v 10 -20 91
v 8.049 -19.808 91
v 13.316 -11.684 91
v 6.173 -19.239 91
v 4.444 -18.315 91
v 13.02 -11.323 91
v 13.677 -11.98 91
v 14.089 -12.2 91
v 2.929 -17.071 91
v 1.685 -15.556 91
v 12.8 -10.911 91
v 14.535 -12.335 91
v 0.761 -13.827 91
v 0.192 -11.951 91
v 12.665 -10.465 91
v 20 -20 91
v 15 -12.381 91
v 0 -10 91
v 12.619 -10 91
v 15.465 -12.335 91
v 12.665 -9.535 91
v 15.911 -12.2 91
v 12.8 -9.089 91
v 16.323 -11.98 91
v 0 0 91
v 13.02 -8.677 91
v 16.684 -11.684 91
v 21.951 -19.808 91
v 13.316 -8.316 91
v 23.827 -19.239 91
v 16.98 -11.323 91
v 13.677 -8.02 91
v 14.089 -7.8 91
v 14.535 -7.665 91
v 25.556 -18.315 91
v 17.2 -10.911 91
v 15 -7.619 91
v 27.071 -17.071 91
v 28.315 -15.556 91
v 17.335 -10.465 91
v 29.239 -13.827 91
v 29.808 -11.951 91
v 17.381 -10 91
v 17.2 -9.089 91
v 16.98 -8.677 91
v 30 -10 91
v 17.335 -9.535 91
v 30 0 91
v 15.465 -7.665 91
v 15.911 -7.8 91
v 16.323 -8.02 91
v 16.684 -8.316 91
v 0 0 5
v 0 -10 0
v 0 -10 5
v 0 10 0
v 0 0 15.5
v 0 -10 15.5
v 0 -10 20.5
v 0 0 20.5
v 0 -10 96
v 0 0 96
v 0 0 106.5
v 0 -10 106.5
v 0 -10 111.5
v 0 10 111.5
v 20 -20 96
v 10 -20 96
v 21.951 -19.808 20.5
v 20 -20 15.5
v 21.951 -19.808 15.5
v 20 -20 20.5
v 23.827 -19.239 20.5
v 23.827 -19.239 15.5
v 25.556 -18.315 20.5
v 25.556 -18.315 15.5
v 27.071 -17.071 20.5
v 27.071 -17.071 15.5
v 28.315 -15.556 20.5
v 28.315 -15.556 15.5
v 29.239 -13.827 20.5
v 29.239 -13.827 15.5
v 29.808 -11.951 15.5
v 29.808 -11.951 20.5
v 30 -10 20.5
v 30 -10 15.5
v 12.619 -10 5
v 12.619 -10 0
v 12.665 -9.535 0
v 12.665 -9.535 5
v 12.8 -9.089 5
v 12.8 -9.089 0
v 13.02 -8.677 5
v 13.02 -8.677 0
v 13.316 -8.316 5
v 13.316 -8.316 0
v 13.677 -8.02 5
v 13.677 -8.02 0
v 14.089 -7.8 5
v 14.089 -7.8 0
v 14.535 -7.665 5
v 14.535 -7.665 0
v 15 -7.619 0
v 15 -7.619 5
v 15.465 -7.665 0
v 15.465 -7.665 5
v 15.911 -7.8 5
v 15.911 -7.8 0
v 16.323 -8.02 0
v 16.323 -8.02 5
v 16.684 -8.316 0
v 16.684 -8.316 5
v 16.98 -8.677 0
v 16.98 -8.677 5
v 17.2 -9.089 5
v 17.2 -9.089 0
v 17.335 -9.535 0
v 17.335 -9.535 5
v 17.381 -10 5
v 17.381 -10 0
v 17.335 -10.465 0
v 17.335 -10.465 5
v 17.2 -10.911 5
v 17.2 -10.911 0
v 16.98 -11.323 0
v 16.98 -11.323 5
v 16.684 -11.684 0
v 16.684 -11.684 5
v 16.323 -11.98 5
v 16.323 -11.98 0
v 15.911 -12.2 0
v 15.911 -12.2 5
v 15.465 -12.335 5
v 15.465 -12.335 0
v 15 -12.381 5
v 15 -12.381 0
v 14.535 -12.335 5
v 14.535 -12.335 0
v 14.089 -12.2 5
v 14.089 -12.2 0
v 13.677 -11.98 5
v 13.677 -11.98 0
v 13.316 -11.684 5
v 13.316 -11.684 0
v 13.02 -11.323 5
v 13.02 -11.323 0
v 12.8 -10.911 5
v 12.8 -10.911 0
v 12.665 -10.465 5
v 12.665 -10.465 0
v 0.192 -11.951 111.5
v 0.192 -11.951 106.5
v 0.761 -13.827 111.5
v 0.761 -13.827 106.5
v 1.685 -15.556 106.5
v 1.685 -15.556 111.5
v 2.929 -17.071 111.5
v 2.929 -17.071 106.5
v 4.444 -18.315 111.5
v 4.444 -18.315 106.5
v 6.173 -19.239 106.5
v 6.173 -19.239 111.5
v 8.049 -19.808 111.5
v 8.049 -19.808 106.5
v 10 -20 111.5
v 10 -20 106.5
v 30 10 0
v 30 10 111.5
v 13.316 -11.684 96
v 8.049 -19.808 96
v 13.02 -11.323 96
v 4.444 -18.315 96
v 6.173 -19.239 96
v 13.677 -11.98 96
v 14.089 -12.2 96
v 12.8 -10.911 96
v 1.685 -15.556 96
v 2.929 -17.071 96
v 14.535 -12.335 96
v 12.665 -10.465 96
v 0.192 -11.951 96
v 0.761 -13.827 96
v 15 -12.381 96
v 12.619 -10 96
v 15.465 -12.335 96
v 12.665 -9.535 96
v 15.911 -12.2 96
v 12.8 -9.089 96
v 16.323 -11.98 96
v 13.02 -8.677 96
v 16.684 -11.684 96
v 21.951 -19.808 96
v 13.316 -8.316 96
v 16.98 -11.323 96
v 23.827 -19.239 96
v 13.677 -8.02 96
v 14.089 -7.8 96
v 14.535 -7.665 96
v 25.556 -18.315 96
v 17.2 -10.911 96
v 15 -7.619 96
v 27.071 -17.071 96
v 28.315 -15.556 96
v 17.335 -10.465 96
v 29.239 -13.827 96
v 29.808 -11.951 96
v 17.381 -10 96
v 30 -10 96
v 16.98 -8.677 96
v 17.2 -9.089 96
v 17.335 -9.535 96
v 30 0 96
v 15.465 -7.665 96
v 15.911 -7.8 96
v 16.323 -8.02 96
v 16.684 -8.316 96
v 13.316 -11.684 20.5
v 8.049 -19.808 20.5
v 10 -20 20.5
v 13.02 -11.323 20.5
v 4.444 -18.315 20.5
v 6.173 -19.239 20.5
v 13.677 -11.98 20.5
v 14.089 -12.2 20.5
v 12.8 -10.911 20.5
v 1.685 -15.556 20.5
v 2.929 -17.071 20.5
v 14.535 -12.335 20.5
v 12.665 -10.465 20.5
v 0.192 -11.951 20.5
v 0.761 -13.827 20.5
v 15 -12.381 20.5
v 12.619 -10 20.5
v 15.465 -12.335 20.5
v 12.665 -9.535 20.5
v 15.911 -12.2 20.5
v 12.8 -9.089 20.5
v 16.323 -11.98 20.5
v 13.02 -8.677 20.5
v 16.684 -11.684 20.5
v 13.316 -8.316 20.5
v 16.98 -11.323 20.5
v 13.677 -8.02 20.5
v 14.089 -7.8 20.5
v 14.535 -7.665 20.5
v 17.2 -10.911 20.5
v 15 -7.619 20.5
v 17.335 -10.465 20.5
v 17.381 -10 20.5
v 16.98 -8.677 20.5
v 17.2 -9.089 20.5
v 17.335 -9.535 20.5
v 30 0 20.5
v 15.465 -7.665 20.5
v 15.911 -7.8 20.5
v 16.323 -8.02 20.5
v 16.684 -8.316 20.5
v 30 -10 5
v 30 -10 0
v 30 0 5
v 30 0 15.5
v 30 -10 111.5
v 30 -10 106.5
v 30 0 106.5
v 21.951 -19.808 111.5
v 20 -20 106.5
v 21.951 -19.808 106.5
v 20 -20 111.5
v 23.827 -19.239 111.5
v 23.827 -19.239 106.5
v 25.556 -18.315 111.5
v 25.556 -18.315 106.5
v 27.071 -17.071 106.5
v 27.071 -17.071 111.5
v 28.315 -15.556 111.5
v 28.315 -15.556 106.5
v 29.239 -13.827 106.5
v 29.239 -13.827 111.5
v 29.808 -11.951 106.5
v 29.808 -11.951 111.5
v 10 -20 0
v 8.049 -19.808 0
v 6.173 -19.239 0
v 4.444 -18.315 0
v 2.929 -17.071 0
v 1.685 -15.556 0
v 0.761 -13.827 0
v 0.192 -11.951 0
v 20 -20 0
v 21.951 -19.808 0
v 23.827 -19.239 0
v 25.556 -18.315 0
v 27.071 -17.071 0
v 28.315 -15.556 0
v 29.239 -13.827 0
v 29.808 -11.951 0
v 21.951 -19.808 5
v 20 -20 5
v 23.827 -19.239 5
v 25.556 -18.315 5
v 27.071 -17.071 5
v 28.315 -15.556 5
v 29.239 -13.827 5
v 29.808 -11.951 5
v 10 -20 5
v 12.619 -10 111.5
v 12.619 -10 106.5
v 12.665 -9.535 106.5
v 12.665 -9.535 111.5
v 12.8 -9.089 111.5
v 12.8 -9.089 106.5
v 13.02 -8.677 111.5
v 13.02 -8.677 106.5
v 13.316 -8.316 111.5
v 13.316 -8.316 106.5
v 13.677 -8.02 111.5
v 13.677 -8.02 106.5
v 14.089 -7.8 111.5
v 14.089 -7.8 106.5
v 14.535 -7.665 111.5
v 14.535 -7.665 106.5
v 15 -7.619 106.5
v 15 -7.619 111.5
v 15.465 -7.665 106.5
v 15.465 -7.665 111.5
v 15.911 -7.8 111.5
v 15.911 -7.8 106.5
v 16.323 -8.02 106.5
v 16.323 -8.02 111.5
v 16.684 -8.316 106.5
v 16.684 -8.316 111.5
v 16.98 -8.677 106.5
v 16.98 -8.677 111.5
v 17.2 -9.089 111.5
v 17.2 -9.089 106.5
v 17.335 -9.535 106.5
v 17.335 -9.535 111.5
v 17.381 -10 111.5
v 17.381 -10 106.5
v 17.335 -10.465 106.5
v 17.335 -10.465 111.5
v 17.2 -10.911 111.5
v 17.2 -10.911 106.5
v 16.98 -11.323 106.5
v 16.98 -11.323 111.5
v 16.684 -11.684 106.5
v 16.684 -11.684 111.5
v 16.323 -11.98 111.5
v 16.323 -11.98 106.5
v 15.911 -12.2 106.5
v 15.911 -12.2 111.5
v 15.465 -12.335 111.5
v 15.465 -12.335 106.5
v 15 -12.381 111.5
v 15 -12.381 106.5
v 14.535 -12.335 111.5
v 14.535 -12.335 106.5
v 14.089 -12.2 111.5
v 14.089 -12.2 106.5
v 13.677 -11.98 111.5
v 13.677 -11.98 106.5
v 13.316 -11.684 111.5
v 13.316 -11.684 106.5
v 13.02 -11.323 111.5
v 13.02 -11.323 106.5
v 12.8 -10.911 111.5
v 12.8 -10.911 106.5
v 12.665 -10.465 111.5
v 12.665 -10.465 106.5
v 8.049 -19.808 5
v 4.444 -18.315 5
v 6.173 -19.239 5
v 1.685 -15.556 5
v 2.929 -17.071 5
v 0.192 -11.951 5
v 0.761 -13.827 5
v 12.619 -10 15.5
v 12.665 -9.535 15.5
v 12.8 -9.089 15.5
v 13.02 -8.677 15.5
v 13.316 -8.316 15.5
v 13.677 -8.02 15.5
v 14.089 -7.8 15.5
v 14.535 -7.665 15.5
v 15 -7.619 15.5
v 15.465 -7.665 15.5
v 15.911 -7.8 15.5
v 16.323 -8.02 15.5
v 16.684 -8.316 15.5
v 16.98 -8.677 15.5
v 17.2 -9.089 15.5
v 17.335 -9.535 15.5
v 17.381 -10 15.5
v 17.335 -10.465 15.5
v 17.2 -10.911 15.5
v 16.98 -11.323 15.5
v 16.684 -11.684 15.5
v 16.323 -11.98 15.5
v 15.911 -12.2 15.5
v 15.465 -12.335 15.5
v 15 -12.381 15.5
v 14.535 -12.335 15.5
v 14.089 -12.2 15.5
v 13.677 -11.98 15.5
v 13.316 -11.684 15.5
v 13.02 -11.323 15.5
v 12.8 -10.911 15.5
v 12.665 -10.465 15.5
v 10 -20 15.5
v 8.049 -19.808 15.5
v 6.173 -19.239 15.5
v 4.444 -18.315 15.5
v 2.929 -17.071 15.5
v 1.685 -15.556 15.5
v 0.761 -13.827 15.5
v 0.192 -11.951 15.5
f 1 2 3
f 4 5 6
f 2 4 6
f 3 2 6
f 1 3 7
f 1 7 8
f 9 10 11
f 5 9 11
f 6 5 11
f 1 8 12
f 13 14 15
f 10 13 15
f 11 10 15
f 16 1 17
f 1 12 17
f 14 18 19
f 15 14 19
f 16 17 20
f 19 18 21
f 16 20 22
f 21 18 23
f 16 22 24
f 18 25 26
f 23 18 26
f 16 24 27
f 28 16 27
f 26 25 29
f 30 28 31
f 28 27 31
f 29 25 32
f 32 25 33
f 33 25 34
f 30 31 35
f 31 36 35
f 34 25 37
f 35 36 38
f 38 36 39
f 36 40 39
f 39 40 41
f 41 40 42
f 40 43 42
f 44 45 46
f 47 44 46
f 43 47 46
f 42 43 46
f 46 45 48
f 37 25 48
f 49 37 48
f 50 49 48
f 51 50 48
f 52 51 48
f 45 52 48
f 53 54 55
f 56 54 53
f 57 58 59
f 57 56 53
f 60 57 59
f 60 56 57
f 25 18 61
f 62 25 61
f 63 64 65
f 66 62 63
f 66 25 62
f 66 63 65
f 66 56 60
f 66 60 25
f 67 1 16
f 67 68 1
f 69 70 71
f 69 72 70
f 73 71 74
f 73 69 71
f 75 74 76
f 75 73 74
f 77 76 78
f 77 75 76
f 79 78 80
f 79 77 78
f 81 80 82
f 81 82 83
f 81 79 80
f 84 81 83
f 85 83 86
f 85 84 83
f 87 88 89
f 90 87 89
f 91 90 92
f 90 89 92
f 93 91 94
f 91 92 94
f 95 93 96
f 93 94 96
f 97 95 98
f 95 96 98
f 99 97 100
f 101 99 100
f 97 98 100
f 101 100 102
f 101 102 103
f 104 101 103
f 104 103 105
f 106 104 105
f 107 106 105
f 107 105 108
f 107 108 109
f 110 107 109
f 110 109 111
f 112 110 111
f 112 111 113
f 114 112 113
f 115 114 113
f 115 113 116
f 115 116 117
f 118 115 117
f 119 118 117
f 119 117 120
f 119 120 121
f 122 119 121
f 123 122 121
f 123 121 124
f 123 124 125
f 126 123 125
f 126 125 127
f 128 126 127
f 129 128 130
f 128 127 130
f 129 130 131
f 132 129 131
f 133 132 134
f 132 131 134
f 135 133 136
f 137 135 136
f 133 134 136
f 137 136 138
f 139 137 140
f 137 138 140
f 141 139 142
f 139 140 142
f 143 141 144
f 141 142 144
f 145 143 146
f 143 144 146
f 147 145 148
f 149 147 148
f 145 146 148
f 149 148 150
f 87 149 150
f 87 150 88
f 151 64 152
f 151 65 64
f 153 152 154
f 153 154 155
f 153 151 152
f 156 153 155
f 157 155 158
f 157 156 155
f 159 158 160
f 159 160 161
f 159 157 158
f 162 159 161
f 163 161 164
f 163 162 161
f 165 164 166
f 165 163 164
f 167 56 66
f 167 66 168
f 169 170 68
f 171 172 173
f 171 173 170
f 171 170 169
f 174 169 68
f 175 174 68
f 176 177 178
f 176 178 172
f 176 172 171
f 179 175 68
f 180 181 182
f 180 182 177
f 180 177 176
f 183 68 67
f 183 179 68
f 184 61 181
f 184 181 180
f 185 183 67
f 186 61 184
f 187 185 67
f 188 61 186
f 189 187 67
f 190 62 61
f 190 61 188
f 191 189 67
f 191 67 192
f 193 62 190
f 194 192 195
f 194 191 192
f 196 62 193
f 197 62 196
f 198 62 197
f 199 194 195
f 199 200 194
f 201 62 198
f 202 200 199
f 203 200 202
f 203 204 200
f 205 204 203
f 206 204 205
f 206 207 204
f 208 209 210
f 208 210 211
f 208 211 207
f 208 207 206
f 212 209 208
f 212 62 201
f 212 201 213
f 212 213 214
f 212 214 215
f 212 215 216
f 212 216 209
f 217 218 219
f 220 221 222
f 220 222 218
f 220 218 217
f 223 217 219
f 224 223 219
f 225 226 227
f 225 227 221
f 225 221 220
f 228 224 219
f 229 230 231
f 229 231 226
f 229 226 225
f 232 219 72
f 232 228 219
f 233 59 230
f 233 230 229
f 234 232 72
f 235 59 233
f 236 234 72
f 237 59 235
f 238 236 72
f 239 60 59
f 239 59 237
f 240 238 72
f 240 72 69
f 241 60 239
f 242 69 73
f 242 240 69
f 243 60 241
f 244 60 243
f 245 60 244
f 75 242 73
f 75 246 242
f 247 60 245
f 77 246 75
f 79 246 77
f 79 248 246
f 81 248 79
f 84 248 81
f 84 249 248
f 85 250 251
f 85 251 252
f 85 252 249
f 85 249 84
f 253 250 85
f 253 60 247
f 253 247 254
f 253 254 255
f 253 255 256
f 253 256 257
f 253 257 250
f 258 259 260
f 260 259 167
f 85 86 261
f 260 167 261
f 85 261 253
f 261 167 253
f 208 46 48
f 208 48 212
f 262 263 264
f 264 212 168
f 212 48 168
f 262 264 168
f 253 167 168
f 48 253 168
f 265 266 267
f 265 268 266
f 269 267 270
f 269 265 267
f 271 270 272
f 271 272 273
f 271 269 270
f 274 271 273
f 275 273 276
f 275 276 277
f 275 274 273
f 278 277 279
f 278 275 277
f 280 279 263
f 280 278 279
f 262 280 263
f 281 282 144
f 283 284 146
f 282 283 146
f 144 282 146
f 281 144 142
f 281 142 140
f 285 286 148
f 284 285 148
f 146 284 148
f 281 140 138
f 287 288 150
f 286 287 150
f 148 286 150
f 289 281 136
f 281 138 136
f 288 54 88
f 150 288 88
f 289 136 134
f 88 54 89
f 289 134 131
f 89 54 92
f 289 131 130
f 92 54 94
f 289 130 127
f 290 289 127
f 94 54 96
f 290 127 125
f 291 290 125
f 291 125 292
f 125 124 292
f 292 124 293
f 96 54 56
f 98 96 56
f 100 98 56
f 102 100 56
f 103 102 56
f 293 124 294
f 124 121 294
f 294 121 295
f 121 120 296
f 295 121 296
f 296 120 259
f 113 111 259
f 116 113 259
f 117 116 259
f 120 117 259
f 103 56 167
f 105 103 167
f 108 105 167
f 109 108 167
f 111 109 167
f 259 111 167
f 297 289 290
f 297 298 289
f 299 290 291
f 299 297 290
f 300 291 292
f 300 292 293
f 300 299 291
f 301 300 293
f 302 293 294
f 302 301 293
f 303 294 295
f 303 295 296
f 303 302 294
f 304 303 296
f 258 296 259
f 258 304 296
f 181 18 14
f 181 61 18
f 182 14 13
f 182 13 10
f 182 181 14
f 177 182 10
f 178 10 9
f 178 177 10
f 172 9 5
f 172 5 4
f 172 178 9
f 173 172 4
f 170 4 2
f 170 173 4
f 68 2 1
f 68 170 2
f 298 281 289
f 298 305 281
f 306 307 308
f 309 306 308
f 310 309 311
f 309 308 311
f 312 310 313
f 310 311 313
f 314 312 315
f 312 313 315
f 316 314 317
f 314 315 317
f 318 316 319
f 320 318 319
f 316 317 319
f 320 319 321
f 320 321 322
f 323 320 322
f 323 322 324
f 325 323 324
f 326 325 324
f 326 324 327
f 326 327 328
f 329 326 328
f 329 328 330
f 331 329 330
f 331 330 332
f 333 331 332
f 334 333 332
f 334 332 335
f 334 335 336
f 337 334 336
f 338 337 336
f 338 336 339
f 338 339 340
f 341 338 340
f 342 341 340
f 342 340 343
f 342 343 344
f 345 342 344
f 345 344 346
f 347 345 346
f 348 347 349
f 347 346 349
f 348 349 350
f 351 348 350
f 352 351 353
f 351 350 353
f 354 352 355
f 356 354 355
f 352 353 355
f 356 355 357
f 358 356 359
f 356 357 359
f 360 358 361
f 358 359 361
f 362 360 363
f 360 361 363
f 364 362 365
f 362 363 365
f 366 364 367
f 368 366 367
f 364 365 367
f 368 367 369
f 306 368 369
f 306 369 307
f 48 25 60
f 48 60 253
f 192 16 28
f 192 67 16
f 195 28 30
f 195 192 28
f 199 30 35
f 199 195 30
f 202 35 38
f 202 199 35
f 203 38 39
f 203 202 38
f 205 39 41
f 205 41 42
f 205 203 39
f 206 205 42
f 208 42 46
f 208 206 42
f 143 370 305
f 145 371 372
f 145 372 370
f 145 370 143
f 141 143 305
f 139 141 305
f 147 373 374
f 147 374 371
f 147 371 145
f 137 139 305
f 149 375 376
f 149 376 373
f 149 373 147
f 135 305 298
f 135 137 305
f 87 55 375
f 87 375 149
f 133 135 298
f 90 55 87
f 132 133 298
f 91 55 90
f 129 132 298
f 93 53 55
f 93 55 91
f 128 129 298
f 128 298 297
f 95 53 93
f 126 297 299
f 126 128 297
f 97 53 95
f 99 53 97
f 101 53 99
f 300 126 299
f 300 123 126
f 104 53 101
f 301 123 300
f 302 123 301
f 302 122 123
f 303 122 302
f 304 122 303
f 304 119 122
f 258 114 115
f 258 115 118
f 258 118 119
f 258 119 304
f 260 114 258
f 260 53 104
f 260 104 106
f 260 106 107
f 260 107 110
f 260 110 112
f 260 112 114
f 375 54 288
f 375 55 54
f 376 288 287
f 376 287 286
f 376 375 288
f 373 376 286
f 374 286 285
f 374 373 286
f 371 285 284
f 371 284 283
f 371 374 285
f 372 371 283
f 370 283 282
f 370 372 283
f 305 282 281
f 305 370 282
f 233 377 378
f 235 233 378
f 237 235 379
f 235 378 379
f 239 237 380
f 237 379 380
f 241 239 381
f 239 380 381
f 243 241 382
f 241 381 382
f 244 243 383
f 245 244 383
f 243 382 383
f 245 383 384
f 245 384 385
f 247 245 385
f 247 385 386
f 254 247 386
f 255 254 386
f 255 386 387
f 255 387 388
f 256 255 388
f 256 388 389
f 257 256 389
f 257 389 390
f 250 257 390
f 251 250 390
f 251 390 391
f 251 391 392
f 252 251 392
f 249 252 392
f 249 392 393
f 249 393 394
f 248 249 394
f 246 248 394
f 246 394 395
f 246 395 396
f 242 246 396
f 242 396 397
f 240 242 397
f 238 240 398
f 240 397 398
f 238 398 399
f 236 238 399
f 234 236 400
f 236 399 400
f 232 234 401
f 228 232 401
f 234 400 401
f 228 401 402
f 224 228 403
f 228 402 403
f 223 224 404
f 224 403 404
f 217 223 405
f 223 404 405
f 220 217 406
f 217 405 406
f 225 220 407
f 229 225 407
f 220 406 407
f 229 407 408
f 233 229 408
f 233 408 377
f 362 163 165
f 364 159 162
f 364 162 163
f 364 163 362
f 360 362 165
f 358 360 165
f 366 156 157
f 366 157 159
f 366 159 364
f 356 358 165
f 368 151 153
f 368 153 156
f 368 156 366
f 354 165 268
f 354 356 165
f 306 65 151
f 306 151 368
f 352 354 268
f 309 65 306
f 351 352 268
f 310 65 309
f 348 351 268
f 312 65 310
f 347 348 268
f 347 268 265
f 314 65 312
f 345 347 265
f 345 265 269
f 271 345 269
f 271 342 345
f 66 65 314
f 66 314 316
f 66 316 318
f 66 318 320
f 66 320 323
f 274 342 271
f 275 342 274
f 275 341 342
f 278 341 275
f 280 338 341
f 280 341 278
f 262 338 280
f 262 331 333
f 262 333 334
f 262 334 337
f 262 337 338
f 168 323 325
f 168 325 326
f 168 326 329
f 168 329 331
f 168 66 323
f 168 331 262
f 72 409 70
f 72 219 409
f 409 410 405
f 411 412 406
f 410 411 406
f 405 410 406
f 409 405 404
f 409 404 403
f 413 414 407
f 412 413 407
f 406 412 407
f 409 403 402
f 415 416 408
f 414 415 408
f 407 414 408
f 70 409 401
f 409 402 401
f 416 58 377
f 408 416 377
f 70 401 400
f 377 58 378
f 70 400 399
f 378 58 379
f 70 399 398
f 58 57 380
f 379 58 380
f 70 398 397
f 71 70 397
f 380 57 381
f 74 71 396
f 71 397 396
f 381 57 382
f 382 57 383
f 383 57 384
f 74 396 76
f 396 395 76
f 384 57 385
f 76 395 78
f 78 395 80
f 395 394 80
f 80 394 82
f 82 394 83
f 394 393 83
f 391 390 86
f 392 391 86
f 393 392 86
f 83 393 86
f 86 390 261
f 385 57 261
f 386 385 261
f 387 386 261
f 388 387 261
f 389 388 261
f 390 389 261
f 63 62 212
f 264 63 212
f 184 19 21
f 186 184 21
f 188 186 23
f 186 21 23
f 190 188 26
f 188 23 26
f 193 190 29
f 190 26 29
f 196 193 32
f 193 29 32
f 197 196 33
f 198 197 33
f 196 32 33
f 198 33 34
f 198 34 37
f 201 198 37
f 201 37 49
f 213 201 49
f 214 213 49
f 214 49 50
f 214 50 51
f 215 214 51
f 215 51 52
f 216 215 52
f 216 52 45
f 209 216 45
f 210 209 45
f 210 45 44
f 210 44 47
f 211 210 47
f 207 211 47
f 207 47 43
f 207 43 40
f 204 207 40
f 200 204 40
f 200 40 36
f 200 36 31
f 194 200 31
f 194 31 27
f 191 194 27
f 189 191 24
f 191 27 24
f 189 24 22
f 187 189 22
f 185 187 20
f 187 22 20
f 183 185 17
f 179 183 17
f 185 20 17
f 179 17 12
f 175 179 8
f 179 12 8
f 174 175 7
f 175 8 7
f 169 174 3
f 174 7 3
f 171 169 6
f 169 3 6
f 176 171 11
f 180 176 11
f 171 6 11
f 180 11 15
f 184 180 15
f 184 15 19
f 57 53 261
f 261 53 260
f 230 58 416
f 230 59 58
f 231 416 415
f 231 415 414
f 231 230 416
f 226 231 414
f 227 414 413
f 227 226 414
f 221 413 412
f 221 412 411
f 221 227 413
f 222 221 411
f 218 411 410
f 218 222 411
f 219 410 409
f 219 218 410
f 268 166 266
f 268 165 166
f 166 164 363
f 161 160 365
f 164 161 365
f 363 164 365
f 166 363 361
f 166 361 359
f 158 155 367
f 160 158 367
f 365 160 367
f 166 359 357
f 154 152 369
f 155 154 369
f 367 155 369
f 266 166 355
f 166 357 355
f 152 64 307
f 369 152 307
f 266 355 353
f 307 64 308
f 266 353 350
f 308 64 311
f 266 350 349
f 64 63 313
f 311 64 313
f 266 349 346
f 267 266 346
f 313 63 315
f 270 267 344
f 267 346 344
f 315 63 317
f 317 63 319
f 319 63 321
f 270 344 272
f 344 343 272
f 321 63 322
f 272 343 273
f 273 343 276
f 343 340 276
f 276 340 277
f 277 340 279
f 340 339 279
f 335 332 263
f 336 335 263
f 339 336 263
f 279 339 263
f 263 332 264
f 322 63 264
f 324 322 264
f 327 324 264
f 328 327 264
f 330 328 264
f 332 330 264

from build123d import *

# Parameters (mm, degrees)
ESQUISSE1_W                             = 30
ESQUISSE1_H                             = 10
BOSS_EXTRU_1_DEPTH                      = 111.5
ESQUISSE2_W                             = 30
ESQUISSE2_H                             = 5
BOSS_EXTRU_2_DEPTH                      = 20
PER_AGE_POUR_CROUS_AUTO_BLOQUANTS_300_D = 4.7625
CONG_1_R                                = 10


with BuildPart() as part:
    # Esquisse1 → Boss.-Extru.1 (new body)
    with BuildSketch(Plane.XY):
        with Locations((15, 5)):
            Rectangle(ESQUISSE1_W, ESQUISSE1_H)
    extrude(amount=BOSS_EXTRU_1_DEPTH)

    # Esquisse2 → Boss.-Extru.2 (add)
    with BuildSketch(Plane.XZ):
        with Locations((15, 2.5)):
            Rectangle(ESQUISSE2_W, ESQUISSE2_H)
        with Locations((15, 18)):
            Rectangle(ESQUISSE2_W, ESQUISSE2_H)
        with Locations((15, 109)):
            Rectangle(ESQUISSE2_W, ESQUISSE2_H)
        with Locations((15, 93.5)):
            Rectangle(ESQUISSE2_W, ESQUISSE2_H)
    extrude(amount=BOSS_EXTRU_2_DEPTH)

    # Perçage pour écrous auto-bloquants 300® #6 (SP)1 (through all)
    with Locations(Plane.XY.offset(111.5)):
        with Locations((15, -10)):
            Hole(PER_AGE_POUR_CROUS_AUTO_BLOQUANTS_300_D / 2)

    # Congé1
    cong_1_edges = [part.edges().sort_by_distance(p)[0] for p in [
        (0, -20, 2.5),
        (30, -20, 2.5),
        (30, -20, 18),
        (0, -20, 18),
        (0, -20, 109),
        (30, -20, 109),
        (30, -20, 93.5),
        (0, -20, 93.5),
    ]]
    fillet(cong_1_edges, radius=CONG_1_R)


solid = part.part
